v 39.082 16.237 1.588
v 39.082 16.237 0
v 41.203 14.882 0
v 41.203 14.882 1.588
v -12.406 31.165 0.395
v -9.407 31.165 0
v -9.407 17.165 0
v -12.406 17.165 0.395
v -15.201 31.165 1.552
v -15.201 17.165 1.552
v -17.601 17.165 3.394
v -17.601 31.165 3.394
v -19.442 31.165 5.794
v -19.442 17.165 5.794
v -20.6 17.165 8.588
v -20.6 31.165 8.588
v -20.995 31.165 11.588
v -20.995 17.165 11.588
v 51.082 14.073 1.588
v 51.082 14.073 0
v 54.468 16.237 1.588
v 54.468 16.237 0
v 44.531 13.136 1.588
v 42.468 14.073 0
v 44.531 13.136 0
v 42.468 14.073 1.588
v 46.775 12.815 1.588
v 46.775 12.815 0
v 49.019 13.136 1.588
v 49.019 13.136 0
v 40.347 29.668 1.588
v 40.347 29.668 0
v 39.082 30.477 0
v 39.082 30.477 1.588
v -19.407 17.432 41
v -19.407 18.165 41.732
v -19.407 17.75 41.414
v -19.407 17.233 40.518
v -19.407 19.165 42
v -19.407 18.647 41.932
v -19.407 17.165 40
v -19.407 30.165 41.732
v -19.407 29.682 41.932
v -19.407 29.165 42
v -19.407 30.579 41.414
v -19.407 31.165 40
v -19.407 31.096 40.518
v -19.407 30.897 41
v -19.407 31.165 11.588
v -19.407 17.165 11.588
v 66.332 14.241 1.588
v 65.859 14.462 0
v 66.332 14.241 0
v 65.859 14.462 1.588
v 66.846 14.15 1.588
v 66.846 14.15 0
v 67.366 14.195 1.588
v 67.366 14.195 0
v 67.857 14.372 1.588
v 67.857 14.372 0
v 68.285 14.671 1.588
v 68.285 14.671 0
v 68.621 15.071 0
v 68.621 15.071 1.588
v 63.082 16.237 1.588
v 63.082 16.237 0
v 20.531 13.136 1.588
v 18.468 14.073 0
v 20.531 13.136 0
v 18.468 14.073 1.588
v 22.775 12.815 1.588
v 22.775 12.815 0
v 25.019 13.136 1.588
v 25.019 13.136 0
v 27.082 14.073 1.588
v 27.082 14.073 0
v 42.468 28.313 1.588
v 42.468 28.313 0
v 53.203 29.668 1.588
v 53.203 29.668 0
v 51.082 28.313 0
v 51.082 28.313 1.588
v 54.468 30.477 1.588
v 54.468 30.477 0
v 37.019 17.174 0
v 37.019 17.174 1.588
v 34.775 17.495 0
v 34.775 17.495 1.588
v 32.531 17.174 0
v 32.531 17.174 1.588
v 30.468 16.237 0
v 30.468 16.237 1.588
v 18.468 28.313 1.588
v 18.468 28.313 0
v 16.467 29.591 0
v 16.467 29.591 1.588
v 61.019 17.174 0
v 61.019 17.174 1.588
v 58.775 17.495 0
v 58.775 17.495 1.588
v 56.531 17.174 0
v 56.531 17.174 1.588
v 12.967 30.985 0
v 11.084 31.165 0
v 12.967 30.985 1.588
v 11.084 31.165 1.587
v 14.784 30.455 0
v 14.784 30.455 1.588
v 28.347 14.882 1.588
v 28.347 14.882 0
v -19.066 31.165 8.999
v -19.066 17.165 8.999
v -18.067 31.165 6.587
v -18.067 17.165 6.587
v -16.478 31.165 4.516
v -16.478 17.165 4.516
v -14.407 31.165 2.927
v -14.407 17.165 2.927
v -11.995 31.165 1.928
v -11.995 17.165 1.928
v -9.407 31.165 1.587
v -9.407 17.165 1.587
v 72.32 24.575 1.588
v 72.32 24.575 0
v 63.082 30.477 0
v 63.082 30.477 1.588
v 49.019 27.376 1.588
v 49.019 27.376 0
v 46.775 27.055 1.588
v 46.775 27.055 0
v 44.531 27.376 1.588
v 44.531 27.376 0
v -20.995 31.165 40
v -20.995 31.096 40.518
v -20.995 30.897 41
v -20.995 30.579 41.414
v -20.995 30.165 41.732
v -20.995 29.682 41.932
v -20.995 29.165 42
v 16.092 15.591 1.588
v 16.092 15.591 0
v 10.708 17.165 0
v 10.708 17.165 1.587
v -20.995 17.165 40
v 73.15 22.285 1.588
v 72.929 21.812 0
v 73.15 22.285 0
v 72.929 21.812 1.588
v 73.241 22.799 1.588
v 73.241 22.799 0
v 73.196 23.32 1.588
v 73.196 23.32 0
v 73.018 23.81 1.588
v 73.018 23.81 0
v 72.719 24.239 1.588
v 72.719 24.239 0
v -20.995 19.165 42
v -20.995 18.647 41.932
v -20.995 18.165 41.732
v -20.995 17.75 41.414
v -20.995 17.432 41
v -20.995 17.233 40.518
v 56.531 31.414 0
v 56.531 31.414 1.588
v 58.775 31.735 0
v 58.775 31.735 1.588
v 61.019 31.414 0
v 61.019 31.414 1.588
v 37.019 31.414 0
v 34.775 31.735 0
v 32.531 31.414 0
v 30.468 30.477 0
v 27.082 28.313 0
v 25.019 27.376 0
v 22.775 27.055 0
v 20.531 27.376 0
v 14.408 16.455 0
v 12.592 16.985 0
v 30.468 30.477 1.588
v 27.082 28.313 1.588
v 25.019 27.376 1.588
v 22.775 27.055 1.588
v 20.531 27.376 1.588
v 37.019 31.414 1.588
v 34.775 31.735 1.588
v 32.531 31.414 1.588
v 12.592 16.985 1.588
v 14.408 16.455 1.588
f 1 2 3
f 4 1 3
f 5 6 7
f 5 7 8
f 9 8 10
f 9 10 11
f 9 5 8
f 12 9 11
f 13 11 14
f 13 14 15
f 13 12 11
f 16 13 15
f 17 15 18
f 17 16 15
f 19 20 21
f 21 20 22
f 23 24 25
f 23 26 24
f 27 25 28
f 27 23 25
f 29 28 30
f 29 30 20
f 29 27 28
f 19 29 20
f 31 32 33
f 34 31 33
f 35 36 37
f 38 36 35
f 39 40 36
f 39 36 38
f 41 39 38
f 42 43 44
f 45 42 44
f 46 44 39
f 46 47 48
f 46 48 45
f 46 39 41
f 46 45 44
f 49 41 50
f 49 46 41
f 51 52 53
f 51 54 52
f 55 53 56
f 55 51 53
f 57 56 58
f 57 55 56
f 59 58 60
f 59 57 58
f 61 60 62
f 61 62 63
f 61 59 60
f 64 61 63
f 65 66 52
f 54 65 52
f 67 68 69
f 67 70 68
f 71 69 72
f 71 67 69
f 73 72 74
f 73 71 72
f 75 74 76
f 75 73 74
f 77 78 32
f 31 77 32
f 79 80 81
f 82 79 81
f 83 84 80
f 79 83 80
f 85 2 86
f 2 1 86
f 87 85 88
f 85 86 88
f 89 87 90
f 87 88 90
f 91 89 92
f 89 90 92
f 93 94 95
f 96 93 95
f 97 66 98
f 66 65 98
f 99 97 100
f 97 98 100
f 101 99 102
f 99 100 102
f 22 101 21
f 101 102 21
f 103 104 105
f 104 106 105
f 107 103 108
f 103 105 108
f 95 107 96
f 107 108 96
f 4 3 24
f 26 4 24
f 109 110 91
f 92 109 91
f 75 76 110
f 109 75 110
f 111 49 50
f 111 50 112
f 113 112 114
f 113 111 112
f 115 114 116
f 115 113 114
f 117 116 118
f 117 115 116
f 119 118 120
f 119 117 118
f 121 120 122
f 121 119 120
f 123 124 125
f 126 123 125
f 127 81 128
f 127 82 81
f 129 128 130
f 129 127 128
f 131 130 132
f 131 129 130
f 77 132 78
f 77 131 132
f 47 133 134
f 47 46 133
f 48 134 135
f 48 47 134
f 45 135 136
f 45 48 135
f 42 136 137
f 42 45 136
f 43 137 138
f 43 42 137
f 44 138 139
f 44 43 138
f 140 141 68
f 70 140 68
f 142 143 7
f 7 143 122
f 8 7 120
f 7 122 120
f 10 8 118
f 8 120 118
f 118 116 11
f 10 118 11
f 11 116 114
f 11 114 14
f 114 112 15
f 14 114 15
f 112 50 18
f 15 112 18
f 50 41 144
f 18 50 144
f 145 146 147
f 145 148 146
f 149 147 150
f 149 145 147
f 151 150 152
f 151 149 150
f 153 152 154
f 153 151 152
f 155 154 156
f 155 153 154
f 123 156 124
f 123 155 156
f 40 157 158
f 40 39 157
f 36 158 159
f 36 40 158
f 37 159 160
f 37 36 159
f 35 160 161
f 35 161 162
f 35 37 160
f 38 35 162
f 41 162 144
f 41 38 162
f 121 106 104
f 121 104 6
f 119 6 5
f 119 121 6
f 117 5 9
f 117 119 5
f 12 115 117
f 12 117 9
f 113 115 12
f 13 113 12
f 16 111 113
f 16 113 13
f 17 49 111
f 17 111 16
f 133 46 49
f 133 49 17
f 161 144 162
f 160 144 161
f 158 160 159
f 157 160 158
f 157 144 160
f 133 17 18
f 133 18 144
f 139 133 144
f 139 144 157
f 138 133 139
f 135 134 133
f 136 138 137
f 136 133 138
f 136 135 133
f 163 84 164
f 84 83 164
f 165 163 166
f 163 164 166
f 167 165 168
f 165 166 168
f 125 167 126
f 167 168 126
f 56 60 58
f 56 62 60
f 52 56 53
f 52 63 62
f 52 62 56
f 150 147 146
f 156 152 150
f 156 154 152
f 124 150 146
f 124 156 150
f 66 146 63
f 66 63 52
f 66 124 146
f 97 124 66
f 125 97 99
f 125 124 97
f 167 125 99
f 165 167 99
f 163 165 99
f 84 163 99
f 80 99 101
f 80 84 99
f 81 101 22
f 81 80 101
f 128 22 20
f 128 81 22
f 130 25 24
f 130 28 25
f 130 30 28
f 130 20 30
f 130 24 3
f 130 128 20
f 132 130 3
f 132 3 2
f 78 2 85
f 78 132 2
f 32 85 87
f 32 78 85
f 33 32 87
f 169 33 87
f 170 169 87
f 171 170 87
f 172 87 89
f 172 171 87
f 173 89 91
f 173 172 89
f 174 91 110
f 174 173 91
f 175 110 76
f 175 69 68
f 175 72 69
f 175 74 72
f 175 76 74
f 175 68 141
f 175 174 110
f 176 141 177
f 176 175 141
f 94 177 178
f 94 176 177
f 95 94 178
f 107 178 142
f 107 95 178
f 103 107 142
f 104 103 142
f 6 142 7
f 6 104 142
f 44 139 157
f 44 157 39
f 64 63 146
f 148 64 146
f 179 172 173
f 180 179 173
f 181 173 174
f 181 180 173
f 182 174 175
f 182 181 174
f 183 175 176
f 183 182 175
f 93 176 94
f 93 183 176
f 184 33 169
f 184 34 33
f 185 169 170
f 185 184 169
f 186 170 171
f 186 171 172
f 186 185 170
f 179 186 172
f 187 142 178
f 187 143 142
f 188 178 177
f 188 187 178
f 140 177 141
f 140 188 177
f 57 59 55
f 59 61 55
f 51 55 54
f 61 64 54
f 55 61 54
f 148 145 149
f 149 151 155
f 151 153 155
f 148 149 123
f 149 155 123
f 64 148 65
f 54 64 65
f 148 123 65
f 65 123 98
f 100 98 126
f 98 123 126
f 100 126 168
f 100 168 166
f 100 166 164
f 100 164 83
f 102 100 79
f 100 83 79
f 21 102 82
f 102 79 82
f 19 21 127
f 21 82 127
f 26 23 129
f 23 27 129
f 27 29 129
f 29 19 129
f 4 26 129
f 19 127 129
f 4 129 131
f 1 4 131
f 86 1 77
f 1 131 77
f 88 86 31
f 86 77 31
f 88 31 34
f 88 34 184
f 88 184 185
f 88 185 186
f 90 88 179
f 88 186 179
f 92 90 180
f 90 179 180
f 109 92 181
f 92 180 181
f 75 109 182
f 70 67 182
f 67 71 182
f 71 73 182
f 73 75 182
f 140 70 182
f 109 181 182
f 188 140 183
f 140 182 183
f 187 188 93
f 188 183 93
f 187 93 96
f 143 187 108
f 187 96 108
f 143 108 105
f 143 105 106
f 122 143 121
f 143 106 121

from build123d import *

# Parameters (mm, degrees)
BOSS_EXTRUDE1_DEPTH          = 1.5875
FILLET3_R                    = 8
FILLET4_R                    = 8
BOSS_EXTRUDE3_DEPTH          = 1.5875
EDGE_FLANGE1_STRIP_W         = 26.35
EDGE_FLANGE1_STRIP_H         = 1.5875
EDGE_FLANGE1_STRIP_CUT_DEPTH = 14
EDGE_FLANGE1_DEPTH           = 14
FILLET5_R                    = 10
FILLET9_R                    = 2


# Sheet-metal steps are written as plain solids
with BuildPart() as part:
    # Sketch3 → Boss-Extrude1 (new body)
    with BuildSketch(Plane.XY):
        Polygon((58.775, 33.228336454), (53.202823644, 29.668334894), (46.775, 25.561669788), (40.347176356, 29.668334894), (34.775, 33.228336454), (22.775, 25.561669788), (14.005335663, 31.164510892), (7.544664337, 21.052155774), (22.775, 11.321663546), (28.347176356, 14.881665106), (34.775, 18.988330212), (41.202823644, 14.881665106), (46.775, 11.321663546), (58.775, 18.988330212), (67.544664337, 13.385489108), (74.005335663, 23.497844226), align=None)
    extrude(amount=BOSS_EXTRUDE1_DEPTH)

    # Fillet3
    fillet3_edges = [part.edges().sort_by_distance(p)[0] for p in [
        (46.775, 11.321663546, 0.79375),
        (22.775, 11.321663546, 0.79375),
        (34.775, 33.228336454, 0.79375),
        (58.775, 33.228336454, 0.79375),
    ]]
    fillet(fillet3_edges, radius=FILLET3_R)

    # Fillet4
    fillet4_edges = [part.edges().sort_by_distance(p)[0] for p in [
        (34.775, 18.988330212, 0.79375),
        (22.775, 25.561669788, 0.79375),
        (46.775, 25.561669788, 0.79375),
        (58.775, 18.988330212, 0.79375),
    ]]
    fillet(fillet4_edges, radius=FILLET4_R)

    # Sketch5 → Boss-Extrude3 (add)
    with BuildSketch(Plane(origin=(0, 0, 0), x_dir=(-1, 0, 0), z_dir=(0, 0, -1))):
        Polygon((20.994664337, 31.164510892), (-14.005335663, 31.164510892), (-7.544664337, 21.052155774), (-13.629673718, 17.164510892), (20.994664337, 17.164510892), align=None)
    extrude(amount=-BOSS_EXTRUDE3_DEPTH)

    # Edge-Flange1 strip (across the edge) → Edge-Flange1 strip cut (cut)
    with BuildSketch(Plane(origin=(-20.994664337, 31.164510892, 1.5875), x_dir=(1, 0, 0), z_dir=(0, -1, 0))):
        with Locations((-1.5875, -0.79375)):
            Rectangle(EDGE_FLANGE1_STRIP_W, EDGE_FLANGE1_STRIP_H)
    extrude(amount=EDGE_FLANGE1_STRIP_CUT_DEPTH, mode=Mode.SUBTRACT)

    # Edge-Flange1 section (across the edge) → Edge-Flange1 (add)
    with BuildSketch(Plane(origin=(-20.994664337, 31.164510892, 1.5875), x_dir=(1, 0, 0), z_dir=(0, -1, 0))):
        with BuildLine():
            Line((0, 10), (0, 40.4125))
            Line((0, 40.4125), (1.5875, 40.4125))
            Line((1.5875, 40.4125), (1.5875, 10))
            ThreePointArc((1.5875, 10), (4.516432188, 2.928932188), (11.5875, 0))
            Line((11.5875, 0), (11.5875, -1.5875))
            ThreePointArc((11.5875, -1.5875), (3.393900173, 1.806400173), (0, 10))
        make_face()
    extrude(amount=EDGE_FLANGE1_DEPTH)

    # Fillet5
    fillet5_edges = [part.edges().sort_by_distance(p)[0] for p in [
        (14.005335663, 31.164510892, 0.79375),
        (13.629673718, 17.164510892, 0.79375),
    ]]
    fillet(fillet5_edges, radius=FILLET5_R)

    # Fillet9
    fillet9_edges = [part.edges().sort_by_distance(p)[0] for p in [
        (67.544664337, 13.385489108, 0.79375),
        (74.005335663, 23.497844226, 0.79375),
        (-20.200914337, 31.164510892, 42),
        (-20.200914337, 17.164510892, 42),
    ]]
    fillet(fillet9_edges, radius=FILLET9_R)


solid = part.part
